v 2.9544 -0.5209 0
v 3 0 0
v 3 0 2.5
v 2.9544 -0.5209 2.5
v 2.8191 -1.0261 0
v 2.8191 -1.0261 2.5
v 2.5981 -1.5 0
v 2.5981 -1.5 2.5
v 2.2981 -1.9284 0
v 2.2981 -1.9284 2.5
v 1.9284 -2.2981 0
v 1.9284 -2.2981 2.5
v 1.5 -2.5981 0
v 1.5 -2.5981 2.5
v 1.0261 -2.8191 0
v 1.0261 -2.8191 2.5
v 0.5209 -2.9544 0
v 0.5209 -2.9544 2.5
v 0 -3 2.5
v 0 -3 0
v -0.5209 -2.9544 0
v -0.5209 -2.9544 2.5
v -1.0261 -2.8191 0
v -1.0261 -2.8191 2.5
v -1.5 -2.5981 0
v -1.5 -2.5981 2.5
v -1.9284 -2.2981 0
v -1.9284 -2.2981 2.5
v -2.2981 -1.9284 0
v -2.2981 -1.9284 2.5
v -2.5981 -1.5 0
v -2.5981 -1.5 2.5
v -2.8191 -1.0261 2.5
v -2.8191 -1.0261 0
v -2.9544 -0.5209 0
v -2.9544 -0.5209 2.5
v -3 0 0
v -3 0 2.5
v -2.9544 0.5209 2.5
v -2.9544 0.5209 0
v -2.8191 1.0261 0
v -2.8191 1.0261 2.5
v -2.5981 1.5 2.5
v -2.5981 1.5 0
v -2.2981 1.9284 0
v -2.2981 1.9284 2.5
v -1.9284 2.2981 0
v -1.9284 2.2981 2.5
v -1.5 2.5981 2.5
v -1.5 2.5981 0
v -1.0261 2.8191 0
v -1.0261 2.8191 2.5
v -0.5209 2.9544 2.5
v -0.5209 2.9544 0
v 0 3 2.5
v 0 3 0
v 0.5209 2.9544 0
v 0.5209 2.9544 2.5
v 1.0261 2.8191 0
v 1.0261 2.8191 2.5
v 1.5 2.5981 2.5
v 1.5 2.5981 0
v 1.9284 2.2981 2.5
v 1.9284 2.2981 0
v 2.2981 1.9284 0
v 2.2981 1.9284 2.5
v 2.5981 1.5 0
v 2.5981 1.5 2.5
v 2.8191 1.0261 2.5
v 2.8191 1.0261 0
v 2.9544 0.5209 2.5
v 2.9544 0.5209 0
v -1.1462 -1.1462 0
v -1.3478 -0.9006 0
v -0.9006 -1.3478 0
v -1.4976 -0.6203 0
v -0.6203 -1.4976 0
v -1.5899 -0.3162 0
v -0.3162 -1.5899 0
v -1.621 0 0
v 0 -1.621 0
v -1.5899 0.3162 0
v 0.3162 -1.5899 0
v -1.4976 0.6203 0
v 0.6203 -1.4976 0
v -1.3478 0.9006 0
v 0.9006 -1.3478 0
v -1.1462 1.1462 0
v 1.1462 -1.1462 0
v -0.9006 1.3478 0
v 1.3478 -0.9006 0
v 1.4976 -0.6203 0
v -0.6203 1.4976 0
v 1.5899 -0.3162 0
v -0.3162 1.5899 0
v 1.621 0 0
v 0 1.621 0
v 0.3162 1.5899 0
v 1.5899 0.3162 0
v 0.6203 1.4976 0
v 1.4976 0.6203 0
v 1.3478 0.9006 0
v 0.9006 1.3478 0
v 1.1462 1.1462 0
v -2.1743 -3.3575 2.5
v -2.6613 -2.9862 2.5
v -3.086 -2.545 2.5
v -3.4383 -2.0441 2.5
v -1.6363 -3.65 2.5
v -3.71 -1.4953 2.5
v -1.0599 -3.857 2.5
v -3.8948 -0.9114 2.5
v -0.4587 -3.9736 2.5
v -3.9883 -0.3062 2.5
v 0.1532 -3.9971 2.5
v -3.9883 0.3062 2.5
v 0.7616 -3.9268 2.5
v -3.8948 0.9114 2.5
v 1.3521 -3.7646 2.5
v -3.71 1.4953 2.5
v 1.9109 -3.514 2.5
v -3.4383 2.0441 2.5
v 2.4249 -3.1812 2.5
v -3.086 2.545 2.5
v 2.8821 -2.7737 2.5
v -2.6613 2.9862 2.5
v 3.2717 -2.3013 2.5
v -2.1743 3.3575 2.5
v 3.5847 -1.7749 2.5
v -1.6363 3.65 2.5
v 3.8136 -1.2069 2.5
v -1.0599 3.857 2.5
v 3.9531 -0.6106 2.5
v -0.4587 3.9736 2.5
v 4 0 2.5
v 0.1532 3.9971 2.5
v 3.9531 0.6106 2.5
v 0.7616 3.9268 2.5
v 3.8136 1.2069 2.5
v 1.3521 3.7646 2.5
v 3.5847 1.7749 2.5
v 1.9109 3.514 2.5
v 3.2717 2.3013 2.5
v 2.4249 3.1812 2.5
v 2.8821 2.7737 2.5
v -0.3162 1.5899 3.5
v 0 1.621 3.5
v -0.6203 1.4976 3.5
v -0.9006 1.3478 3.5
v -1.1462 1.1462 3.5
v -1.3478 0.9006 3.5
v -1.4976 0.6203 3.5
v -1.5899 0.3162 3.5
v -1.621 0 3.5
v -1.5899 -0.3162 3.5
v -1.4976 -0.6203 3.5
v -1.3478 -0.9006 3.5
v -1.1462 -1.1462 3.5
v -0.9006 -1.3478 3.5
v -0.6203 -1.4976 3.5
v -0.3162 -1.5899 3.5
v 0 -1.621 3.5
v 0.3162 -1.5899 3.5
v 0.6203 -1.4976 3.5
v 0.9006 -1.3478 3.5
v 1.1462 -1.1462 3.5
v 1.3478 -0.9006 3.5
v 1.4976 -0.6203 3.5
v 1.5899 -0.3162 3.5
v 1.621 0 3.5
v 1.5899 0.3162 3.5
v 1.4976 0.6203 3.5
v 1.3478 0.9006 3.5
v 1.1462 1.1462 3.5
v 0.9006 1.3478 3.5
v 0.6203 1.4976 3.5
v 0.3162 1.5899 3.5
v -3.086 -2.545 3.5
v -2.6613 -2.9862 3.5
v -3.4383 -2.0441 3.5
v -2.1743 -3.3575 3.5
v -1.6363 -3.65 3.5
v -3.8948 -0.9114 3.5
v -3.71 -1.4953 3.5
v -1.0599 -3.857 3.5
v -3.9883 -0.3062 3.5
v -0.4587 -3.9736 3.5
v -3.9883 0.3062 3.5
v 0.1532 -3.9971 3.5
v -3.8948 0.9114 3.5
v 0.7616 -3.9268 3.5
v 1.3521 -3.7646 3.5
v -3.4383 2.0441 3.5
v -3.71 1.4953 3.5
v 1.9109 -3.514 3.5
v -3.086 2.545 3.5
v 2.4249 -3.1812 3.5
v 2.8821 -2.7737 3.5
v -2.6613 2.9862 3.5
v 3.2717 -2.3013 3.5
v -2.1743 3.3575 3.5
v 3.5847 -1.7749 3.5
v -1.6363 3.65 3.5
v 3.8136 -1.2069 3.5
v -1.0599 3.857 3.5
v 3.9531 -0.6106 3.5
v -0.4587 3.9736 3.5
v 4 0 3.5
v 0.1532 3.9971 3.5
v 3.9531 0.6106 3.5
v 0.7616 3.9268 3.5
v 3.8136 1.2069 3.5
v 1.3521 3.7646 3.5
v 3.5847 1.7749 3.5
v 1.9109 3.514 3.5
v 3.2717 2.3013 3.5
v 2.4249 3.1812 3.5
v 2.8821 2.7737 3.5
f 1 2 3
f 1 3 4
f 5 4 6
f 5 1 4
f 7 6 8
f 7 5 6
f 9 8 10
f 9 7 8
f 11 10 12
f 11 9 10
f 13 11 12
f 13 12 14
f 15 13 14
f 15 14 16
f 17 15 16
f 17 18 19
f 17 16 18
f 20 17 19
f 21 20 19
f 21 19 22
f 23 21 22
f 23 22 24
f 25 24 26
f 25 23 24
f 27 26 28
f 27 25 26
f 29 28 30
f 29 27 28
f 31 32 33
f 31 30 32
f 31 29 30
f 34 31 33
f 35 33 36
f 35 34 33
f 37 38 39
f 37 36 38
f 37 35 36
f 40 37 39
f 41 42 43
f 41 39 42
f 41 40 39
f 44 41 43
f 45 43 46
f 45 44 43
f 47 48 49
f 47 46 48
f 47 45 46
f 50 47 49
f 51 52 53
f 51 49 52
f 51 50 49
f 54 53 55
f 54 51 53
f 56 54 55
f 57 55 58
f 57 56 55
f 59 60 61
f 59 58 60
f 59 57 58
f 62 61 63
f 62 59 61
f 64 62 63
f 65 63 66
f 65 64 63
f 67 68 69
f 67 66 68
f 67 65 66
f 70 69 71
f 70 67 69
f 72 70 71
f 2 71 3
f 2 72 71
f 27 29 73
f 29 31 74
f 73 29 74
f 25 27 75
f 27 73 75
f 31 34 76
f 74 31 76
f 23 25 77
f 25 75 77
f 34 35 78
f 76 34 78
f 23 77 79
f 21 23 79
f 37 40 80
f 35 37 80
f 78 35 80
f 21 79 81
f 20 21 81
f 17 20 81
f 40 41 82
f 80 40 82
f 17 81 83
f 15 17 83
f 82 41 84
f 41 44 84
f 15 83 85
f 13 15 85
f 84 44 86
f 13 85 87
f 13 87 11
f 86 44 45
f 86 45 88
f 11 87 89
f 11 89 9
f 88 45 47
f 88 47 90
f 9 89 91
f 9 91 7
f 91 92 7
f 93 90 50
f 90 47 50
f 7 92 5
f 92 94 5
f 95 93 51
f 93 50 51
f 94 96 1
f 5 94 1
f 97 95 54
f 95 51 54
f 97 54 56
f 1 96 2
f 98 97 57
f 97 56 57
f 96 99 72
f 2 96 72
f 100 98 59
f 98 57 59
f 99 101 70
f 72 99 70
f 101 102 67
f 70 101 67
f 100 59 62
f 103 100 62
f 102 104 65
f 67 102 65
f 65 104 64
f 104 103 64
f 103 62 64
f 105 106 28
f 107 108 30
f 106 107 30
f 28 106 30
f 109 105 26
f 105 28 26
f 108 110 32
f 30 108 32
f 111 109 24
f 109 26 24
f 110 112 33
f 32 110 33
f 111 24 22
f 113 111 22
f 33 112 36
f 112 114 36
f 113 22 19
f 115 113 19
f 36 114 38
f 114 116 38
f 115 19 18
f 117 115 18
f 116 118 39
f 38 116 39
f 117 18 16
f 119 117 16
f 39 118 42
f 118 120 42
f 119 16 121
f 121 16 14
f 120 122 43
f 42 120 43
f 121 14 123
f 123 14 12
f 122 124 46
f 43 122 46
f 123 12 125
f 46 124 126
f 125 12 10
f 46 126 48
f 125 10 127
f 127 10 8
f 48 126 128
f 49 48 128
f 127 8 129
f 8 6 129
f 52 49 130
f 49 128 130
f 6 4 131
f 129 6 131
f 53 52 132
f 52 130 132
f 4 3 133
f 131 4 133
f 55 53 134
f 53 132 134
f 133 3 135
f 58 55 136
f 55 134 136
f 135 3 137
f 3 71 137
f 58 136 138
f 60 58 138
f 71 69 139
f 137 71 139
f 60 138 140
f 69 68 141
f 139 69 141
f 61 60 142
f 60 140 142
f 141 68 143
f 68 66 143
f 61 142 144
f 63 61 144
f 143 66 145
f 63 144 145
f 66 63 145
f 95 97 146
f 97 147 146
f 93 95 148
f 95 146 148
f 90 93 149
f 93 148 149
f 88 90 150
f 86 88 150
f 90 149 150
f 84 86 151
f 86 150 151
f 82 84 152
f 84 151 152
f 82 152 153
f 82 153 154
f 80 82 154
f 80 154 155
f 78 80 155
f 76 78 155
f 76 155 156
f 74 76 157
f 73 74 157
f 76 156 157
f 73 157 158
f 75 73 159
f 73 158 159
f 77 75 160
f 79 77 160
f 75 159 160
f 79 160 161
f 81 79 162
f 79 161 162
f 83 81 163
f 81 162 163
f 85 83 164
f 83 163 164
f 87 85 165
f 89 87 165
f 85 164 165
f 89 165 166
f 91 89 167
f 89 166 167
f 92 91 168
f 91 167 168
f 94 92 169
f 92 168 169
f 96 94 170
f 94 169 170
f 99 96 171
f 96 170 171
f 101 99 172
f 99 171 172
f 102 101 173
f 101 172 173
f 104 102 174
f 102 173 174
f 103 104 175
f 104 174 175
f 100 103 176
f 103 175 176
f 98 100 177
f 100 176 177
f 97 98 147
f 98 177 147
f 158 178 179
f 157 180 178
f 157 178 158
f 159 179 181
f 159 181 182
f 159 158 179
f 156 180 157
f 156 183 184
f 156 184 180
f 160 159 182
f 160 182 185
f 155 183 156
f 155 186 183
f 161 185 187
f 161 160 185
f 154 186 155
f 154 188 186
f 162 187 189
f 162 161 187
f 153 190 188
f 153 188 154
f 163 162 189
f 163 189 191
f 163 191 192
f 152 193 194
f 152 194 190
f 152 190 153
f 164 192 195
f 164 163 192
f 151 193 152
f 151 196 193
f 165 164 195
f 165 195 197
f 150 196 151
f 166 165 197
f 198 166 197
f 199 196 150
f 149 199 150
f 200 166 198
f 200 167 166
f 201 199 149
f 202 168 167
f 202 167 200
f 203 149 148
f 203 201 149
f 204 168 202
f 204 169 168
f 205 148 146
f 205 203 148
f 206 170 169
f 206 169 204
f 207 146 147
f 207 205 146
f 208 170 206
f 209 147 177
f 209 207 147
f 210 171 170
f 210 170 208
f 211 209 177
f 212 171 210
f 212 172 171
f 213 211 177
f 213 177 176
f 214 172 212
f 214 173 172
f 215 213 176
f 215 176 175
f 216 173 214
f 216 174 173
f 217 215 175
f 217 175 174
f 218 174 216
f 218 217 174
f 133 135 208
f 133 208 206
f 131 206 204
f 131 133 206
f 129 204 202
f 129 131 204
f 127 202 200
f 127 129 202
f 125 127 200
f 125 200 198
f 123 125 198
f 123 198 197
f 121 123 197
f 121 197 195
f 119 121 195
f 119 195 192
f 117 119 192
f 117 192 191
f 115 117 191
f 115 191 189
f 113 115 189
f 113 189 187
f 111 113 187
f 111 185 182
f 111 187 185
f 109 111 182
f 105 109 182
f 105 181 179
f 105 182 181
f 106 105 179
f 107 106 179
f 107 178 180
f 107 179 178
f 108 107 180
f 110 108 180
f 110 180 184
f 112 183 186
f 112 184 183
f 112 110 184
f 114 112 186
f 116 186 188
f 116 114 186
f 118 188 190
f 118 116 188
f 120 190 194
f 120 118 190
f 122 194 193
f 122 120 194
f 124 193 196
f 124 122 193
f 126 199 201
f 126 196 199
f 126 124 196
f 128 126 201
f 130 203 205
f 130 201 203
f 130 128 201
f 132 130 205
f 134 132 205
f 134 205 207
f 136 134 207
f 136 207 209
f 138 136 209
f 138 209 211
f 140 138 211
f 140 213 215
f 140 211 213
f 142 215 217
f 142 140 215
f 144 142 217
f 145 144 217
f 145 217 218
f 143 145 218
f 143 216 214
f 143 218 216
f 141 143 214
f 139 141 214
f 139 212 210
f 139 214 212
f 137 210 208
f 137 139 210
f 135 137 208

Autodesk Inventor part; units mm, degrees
ref_plane "YZ Plane" through (0, 0, 0) normal (1, 0, 0) x (0, 1, 0)
ref_plane "XZ Plane" through (0, 0, 0) normal (0, 1, 0) x (-1, 0, 0)
ref_plane "XY Plane" through (0, 0, 0) normal (0, 0, 1) x (1, 0, 0)
sketch "Skizze1" plane through (0, 0, 0) normal (0, 0, 1) x (1, 0, 0)
  circle A0 centre (0, 0) radius 3
  dimension "d0" = 6
extrude "Extrusion1" add sketch "Skizze1" along normal blind 2.5
sketch "Skizze2" plane through (0, 0, 2.5) normal (0, 0, 1) x (1, 0, 0)
  circle A0 centre (0, 0) radius 4
  dimension "d3" = 8
extrude "Extrusion2" add sketch "Skizze2" along normal blind 1
hole "Bohrung1" at (0, 0, 0) direction (0, 0, 1) diameter 3.242 end through all thread size "M4x0.7" class "6H" standard "ANSI Metric M Profile"
properties part number "MutterMitUScheibe"
